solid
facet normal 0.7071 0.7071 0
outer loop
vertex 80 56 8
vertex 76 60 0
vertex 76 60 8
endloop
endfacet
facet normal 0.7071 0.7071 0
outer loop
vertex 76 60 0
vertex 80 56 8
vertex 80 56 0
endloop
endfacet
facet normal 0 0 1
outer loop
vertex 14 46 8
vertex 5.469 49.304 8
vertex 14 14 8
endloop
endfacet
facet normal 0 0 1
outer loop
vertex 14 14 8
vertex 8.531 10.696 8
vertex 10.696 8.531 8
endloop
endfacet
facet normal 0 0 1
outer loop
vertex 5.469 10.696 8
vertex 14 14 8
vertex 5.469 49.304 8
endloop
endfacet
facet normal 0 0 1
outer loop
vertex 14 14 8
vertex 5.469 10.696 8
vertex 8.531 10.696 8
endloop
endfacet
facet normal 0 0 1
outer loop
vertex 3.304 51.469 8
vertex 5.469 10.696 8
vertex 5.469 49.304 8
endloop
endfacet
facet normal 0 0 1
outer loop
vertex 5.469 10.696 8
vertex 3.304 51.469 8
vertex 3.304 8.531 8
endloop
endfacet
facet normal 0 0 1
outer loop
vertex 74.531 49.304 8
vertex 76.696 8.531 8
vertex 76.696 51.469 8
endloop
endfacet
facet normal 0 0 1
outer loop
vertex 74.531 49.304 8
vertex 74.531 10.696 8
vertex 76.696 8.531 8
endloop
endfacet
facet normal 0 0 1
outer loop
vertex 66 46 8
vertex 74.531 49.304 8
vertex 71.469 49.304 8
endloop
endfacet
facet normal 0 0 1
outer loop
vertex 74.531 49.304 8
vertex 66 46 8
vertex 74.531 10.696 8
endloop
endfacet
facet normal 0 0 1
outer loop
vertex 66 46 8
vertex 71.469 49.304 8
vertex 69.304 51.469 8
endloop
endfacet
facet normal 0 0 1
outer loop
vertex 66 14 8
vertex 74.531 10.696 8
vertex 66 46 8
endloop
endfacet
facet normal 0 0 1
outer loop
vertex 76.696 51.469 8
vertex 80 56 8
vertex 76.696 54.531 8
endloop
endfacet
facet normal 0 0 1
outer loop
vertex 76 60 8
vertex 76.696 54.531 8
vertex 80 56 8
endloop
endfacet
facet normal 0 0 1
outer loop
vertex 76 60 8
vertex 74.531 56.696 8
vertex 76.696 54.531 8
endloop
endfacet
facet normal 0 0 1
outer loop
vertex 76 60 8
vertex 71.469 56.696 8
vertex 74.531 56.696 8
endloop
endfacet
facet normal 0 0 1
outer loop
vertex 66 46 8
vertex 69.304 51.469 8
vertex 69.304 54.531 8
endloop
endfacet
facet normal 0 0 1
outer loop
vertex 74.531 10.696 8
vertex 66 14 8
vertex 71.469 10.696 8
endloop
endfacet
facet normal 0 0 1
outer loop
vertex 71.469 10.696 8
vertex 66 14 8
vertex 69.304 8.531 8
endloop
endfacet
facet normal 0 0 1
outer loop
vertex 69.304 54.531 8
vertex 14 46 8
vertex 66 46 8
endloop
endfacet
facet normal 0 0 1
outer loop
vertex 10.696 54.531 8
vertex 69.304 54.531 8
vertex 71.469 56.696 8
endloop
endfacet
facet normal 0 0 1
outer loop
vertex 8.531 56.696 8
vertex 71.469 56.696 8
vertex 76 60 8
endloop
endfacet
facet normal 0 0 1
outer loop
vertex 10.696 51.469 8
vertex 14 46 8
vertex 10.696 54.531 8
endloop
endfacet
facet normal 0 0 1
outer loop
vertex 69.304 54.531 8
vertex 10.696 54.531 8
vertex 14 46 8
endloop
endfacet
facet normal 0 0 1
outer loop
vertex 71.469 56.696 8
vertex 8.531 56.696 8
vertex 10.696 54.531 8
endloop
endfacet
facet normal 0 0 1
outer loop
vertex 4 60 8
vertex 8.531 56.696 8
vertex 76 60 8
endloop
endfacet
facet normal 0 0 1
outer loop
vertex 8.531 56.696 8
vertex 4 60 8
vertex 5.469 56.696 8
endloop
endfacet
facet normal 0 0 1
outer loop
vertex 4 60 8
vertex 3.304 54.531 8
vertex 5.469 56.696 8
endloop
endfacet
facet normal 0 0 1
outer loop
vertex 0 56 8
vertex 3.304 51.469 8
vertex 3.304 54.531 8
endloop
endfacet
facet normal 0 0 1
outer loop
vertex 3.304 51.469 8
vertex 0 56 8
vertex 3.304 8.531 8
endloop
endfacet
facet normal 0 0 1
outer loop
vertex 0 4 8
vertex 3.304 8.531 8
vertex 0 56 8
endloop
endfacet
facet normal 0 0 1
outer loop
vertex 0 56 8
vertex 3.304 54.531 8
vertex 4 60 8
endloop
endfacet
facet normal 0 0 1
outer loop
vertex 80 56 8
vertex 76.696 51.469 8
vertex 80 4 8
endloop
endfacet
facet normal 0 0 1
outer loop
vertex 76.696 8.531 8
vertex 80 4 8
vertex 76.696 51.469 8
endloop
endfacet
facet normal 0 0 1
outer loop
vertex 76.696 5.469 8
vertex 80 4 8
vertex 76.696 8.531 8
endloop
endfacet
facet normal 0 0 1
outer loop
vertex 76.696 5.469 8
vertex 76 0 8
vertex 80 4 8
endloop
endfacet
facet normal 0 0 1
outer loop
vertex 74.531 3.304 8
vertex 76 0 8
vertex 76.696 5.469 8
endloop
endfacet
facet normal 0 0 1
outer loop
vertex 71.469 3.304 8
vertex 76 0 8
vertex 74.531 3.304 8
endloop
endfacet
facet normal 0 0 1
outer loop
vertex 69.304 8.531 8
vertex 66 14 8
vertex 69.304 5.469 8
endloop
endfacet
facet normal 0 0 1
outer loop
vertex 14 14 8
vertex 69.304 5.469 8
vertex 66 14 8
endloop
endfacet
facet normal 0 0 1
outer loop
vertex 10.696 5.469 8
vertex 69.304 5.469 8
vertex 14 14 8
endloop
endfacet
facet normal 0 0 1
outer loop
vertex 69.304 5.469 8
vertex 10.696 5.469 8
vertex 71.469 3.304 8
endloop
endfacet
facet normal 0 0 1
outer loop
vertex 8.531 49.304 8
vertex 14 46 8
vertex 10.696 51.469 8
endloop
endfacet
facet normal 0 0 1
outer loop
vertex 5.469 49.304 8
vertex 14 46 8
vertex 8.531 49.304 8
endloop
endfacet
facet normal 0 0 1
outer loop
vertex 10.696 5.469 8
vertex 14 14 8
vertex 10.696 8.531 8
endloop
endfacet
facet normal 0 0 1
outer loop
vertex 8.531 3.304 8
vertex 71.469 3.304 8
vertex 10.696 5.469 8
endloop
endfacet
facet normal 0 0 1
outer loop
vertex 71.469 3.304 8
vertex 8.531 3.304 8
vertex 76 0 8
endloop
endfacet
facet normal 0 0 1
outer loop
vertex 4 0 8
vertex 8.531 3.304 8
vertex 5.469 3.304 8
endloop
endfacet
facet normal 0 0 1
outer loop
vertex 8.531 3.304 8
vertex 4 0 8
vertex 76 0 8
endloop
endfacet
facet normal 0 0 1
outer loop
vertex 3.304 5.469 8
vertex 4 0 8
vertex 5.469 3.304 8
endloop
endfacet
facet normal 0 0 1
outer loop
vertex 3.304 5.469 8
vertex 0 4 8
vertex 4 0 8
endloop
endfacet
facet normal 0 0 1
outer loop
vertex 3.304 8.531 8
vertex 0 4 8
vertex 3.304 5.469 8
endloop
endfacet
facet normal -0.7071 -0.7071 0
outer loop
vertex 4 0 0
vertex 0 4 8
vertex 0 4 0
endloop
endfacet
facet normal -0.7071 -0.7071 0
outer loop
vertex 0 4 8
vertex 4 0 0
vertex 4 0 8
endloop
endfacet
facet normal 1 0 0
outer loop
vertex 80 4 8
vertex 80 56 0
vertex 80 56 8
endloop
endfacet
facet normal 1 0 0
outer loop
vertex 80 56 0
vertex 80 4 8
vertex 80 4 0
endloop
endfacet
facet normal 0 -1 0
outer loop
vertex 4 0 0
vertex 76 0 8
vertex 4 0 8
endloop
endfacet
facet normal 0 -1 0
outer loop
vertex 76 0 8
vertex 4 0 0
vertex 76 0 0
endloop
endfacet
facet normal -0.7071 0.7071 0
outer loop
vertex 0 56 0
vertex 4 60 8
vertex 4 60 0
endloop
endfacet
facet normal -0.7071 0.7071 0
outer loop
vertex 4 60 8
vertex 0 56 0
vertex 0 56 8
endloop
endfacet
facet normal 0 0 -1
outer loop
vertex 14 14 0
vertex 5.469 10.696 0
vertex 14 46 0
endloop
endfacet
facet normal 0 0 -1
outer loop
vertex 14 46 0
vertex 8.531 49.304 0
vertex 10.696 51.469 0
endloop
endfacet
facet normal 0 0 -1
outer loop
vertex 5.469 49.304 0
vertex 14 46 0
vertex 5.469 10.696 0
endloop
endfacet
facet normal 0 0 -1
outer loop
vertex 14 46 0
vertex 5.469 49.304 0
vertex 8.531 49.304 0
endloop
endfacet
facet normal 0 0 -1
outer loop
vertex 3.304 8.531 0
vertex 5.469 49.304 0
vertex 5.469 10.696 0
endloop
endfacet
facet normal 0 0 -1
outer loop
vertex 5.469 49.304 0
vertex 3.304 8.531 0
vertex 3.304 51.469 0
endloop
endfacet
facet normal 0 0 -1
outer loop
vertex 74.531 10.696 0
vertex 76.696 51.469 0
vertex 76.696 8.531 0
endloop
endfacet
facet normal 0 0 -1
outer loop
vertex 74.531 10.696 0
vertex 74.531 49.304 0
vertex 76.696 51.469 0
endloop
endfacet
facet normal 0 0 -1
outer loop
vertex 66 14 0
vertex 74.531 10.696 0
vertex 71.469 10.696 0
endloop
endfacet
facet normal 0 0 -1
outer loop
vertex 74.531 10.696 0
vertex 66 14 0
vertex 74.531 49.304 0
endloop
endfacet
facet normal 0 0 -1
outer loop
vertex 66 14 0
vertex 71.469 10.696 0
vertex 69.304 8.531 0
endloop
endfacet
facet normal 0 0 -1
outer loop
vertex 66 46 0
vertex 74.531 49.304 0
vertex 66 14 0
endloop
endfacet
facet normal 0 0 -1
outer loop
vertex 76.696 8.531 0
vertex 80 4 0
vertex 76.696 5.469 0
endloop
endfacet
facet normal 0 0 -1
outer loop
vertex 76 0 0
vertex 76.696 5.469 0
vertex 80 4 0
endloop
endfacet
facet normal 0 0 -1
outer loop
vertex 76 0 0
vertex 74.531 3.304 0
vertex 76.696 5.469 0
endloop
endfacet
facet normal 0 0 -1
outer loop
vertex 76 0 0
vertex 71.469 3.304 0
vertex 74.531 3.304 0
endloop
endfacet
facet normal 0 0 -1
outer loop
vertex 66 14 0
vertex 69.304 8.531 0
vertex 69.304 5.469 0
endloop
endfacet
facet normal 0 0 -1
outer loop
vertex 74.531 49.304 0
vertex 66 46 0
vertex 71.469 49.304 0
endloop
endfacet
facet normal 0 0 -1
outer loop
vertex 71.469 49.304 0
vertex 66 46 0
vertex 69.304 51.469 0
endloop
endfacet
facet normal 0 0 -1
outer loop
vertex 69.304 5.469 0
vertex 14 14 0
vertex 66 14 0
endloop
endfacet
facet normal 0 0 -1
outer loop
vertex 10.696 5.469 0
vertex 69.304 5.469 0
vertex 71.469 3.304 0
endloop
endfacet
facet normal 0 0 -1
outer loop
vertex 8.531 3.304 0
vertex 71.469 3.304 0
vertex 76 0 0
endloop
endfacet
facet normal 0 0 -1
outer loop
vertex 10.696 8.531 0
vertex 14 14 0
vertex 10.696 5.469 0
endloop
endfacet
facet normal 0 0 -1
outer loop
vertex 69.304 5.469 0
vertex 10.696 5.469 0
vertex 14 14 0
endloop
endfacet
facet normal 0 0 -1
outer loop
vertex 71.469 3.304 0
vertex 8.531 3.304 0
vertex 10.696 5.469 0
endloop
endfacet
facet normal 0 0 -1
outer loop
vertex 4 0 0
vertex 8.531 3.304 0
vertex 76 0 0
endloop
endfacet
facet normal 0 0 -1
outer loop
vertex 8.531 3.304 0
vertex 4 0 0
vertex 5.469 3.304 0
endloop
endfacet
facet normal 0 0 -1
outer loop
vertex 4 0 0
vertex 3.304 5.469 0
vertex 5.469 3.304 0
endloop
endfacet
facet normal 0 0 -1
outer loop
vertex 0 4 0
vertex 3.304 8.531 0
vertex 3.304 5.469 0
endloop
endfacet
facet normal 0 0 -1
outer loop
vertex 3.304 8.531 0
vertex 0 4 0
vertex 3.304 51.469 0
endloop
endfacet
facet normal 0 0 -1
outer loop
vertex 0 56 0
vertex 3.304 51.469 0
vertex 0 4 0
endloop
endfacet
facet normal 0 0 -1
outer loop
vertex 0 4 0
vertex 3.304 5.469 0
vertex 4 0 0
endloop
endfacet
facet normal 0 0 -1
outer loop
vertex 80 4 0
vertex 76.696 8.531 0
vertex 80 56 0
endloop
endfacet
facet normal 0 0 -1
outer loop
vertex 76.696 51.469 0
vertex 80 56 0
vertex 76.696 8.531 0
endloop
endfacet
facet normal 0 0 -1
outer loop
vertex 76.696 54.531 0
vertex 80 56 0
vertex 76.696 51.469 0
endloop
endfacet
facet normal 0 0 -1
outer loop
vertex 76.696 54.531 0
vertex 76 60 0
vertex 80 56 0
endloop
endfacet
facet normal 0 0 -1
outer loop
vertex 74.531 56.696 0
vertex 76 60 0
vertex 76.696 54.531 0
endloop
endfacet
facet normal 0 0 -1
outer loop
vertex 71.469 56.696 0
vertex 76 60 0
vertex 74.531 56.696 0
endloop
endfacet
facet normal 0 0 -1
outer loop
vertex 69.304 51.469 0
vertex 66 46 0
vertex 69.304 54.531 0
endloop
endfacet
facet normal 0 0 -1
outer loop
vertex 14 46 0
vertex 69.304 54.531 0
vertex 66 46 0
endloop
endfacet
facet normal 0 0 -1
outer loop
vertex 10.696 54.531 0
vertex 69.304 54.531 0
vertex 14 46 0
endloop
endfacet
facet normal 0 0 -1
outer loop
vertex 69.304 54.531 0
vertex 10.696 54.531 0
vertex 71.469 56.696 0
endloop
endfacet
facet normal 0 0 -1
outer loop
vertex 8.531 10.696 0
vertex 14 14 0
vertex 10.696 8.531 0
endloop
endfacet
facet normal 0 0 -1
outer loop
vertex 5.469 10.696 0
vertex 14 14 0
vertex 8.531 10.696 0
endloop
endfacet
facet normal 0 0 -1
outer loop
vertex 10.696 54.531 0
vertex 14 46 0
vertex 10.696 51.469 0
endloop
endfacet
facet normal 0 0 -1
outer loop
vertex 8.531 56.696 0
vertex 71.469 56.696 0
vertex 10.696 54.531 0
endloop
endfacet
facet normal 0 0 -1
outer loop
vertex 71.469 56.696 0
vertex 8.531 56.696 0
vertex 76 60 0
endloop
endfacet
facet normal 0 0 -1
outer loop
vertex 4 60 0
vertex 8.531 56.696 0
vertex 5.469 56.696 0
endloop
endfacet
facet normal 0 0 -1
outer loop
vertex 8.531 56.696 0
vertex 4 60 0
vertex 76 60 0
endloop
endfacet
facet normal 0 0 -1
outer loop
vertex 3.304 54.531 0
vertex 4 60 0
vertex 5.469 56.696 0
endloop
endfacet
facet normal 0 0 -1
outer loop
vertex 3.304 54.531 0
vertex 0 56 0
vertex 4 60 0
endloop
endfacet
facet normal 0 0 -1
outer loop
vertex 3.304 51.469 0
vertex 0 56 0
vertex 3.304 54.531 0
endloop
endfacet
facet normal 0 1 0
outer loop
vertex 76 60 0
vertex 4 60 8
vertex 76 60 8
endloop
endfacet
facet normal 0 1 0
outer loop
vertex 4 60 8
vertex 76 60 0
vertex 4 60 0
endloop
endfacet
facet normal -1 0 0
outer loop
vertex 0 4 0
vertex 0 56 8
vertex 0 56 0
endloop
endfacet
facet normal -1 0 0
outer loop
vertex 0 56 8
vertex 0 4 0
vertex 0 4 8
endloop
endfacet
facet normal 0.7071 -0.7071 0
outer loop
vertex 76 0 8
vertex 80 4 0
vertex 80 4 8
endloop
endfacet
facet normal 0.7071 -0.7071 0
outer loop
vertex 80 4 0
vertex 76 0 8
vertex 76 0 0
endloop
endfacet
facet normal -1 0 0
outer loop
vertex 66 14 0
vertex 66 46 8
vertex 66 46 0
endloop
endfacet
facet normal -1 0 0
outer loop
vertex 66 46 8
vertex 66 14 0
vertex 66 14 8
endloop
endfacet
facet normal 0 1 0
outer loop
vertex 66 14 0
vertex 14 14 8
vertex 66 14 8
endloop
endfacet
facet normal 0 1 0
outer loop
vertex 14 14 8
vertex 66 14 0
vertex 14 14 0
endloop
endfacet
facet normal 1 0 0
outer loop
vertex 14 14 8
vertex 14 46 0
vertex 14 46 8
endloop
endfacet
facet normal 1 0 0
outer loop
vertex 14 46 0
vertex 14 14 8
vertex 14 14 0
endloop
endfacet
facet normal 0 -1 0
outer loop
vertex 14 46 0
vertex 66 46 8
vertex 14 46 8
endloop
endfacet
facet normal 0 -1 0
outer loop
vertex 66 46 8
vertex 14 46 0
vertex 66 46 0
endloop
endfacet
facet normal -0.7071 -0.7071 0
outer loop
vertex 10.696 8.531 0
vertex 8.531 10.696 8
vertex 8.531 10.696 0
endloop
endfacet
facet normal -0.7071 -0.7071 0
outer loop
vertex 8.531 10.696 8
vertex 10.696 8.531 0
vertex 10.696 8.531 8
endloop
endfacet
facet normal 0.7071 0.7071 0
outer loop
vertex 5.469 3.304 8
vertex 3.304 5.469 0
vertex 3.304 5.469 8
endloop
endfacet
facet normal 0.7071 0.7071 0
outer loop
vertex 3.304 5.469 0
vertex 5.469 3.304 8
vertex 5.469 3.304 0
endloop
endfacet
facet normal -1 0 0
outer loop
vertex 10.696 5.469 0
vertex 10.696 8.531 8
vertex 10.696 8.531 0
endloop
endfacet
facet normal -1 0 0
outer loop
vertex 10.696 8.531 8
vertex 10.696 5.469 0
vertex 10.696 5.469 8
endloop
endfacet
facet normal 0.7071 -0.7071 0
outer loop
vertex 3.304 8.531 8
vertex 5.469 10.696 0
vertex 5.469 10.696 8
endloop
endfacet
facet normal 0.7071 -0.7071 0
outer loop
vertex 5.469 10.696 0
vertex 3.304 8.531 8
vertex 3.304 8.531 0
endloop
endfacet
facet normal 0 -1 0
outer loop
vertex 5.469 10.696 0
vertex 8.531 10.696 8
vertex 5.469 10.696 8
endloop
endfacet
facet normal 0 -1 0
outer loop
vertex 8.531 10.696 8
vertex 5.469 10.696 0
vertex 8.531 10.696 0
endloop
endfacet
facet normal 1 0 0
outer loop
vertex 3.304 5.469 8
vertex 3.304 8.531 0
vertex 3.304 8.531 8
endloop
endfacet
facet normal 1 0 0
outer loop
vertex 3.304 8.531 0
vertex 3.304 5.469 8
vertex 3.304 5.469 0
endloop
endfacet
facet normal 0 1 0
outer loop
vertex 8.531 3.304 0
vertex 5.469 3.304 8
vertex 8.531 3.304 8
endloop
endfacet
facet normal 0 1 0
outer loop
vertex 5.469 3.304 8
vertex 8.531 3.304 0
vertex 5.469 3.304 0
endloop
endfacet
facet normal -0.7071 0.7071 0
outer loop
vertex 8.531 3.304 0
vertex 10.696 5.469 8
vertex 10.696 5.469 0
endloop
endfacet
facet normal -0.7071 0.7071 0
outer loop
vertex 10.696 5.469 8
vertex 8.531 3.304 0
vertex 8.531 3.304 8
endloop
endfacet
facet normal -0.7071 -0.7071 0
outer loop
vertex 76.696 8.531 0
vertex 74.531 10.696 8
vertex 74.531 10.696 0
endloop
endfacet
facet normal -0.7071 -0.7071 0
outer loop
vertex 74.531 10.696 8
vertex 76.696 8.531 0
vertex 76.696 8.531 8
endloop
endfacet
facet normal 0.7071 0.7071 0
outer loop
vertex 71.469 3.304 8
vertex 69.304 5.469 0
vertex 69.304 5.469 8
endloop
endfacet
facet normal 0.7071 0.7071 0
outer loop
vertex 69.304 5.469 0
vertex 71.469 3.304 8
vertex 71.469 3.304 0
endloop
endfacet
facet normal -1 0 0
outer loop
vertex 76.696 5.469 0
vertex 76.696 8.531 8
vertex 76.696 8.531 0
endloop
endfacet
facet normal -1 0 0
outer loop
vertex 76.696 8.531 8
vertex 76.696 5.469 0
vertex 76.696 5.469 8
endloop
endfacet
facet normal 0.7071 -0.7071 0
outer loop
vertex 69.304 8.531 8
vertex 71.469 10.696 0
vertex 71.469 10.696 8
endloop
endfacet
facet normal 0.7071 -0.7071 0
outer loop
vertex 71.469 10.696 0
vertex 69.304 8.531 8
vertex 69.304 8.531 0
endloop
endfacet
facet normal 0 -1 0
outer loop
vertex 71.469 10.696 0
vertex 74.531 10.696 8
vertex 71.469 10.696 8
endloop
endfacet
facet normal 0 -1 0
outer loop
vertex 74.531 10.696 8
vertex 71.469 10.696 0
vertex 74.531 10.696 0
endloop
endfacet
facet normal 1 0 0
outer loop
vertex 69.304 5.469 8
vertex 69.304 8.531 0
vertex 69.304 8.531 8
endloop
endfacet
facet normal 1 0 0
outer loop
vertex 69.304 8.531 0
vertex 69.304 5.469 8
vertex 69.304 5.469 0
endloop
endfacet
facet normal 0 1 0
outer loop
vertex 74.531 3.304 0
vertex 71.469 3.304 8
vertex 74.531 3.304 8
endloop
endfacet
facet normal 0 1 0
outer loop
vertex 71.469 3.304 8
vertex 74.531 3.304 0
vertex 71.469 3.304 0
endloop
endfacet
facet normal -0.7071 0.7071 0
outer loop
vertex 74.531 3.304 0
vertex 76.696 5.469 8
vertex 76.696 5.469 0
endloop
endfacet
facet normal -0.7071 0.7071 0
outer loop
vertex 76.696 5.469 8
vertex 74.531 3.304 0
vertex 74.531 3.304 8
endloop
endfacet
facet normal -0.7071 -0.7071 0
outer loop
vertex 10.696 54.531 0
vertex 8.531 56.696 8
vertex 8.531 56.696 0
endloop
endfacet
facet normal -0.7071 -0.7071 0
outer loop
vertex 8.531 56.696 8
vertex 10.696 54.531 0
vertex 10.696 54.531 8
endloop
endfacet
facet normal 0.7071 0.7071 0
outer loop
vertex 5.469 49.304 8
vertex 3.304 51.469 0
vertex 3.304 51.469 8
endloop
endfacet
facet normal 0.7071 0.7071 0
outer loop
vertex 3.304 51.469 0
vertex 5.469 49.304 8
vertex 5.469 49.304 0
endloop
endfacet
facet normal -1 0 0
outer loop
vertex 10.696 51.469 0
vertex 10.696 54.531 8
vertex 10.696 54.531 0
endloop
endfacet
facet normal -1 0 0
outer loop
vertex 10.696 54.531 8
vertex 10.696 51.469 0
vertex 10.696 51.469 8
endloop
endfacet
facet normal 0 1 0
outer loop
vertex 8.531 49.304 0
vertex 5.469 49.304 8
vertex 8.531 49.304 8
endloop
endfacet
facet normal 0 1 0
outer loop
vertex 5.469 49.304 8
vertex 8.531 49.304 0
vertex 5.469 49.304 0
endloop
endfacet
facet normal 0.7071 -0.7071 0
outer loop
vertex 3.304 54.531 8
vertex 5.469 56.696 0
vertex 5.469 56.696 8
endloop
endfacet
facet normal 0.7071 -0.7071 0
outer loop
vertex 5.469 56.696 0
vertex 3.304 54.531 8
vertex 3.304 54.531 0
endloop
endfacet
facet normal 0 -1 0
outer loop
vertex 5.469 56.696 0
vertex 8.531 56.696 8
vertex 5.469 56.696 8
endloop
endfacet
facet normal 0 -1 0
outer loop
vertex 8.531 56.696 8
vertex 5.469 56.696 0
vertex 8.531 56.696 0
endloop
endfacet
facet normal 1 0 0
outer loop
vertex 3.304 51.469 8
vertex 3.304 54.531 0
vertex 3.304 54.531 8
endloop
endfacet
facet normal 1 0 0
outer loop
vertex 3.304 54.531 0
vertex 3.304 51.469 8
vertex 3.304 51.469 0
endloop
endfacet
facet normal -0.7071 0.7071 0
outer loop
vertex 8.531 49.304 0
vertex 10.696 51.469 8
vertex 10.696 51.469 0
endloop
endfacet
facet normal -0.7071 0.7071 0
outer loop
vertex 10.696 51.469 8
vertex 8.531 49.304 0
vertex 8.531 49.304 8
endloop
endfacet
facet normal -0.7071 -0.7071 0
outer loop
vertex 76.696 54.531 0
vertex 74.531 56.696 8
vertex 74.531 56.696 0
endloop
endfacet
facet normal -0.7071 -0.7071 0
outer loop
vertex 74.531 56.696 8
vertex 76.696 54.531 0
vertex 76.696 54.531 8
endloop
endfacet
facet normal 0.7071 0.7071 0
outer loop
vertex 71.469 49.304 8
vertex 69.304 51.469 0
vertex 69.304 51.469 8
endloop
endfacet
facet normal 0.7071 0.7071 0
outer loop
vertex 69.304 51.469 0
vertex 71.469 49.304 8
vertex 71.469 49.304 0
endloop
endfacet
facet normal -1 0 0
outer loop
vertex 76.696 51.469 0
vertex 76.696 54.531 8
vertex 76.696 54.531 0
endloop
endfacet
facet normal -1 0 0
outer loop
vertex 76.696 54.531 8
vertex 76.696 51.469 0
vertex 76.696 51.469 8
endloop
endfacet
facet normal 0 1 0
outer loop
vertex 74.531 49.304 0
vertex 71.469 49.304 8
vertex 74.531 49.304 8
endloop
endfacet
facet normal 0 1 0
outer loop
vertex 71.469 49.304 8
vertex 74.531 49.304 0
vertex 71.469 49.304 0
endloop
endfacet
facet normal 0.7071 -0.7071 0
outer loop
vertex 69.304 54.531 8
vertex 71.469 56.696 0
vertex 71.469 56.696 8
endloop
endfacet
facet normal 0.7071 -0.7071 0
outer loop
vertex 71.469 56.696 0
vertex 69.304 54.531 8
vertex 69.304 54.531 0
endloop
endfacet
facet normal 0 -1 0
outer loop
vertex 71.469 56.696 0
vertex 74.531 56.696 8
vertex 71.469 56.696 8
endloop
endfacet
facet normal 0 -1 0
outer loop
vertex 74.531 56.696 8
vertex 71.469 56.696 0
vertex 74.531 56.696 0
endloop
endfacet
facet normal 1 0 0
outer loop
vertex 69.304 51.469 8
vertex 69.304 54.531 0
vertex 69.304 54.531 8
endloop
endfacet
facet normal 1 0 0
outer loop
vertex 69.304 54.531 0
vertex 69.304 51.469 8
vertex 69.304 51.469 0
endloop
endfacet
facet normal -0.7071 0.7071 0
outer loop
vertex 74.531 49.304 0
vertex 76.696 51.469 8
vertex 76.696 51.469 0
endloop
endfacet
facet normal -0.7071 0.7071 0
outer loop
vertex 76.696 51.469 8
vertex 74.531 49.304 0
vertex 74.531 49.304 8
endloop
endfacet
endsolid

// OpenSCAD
$fn = 32;

// ----------------------------------------------------------------------
// Frame plate: 80 x 60 frame, 14 mm rails
// ----------------------------------------------------------------------

// --- parameters (mm) ---
plate_l = 80;             // plate length, X
plate_w = 60;             // plate width, Y
plate_t = 8;              // plate thickness, Z (extrusion height)
corner_c = 4;             // corner chamfer
frame_bar = 14;           // frame rail width
bolt_r = 4;               // corner bolt window radius
bolt_inset = 7;           // bolt centre inset from the edges

win_l = plate_l - 2 * frame_bar;  // window length
win_w = plate_w - 2 * frame_bar;  // window width
bolt_d = 2 * bolt_r;  // corner hole diameter

profile = [[4, 0], [76, 0], [80, 4], [80, 56], [76, 60], [4, 60], [0, 56], [0, 4]];  // primary outline, 8 points, counter clockwise
void_1 = [[14, 14], [66, 14], [66, 46], [14, 46]];  // the window, 4 points
void_2 = [[10.696, 8.531], [8.531, 10.696], [5.469, 10.696], [3.304, 8.531], [3.304, 5.469], [5.469, 3.304], [8.531, 3.304], [10.696, 5.469]];  // corner bolt window, 8 points
void_3 = [[76.696, 8.531], [74.531, 10.696], [71.469, 10.696], [69.304, 8.531], [69.304, 5.469], [71.469, 3.304], [74.531, 3.304], [76.696, 5.469]];  // corner bolt window, 8 points
void_4 = [[10.696, 54.531], [8.531, 56.696], [5.469, 56.696], [3.304, 54.531], [3.304, 51.469], [5.469, 49.304], [8.531, 49.304], [10.696, 51.469]];  // corner bolt window, 8 points
void_5 = [[76.696, 54.531], [74.531, 56.696], [71.469, 56.696], [69.304, 54.531], [69.304, 51.469], [71.469, 49.304], [74.531, 49.304], [76.696, 51.469]];  // corner bolt window, 8 points

// --- the one profile operation ---
difference() {
  linear_extrude(height = plate_t) polygon(points = profile);
  translate([0, 0, -1])
    linear_extrude(height = plate_t + 2) polygon(points = void_1);
  translate([0, 0, -1])
    linear_extrude(height = plate_t + 2) polygon(points = void_2);
  translate([0, 0, -1])
    linear_extrude(height = plate_t + 2) polygon(points = void_3);
  translate([0, 0, -1])
    linear_extrude(height = plate_t + 2) polygon(points = void_4);
  translate([0, 0, -1])
    linear_extrude(height = plate_t + 2) polygon(points = void_5);
}
